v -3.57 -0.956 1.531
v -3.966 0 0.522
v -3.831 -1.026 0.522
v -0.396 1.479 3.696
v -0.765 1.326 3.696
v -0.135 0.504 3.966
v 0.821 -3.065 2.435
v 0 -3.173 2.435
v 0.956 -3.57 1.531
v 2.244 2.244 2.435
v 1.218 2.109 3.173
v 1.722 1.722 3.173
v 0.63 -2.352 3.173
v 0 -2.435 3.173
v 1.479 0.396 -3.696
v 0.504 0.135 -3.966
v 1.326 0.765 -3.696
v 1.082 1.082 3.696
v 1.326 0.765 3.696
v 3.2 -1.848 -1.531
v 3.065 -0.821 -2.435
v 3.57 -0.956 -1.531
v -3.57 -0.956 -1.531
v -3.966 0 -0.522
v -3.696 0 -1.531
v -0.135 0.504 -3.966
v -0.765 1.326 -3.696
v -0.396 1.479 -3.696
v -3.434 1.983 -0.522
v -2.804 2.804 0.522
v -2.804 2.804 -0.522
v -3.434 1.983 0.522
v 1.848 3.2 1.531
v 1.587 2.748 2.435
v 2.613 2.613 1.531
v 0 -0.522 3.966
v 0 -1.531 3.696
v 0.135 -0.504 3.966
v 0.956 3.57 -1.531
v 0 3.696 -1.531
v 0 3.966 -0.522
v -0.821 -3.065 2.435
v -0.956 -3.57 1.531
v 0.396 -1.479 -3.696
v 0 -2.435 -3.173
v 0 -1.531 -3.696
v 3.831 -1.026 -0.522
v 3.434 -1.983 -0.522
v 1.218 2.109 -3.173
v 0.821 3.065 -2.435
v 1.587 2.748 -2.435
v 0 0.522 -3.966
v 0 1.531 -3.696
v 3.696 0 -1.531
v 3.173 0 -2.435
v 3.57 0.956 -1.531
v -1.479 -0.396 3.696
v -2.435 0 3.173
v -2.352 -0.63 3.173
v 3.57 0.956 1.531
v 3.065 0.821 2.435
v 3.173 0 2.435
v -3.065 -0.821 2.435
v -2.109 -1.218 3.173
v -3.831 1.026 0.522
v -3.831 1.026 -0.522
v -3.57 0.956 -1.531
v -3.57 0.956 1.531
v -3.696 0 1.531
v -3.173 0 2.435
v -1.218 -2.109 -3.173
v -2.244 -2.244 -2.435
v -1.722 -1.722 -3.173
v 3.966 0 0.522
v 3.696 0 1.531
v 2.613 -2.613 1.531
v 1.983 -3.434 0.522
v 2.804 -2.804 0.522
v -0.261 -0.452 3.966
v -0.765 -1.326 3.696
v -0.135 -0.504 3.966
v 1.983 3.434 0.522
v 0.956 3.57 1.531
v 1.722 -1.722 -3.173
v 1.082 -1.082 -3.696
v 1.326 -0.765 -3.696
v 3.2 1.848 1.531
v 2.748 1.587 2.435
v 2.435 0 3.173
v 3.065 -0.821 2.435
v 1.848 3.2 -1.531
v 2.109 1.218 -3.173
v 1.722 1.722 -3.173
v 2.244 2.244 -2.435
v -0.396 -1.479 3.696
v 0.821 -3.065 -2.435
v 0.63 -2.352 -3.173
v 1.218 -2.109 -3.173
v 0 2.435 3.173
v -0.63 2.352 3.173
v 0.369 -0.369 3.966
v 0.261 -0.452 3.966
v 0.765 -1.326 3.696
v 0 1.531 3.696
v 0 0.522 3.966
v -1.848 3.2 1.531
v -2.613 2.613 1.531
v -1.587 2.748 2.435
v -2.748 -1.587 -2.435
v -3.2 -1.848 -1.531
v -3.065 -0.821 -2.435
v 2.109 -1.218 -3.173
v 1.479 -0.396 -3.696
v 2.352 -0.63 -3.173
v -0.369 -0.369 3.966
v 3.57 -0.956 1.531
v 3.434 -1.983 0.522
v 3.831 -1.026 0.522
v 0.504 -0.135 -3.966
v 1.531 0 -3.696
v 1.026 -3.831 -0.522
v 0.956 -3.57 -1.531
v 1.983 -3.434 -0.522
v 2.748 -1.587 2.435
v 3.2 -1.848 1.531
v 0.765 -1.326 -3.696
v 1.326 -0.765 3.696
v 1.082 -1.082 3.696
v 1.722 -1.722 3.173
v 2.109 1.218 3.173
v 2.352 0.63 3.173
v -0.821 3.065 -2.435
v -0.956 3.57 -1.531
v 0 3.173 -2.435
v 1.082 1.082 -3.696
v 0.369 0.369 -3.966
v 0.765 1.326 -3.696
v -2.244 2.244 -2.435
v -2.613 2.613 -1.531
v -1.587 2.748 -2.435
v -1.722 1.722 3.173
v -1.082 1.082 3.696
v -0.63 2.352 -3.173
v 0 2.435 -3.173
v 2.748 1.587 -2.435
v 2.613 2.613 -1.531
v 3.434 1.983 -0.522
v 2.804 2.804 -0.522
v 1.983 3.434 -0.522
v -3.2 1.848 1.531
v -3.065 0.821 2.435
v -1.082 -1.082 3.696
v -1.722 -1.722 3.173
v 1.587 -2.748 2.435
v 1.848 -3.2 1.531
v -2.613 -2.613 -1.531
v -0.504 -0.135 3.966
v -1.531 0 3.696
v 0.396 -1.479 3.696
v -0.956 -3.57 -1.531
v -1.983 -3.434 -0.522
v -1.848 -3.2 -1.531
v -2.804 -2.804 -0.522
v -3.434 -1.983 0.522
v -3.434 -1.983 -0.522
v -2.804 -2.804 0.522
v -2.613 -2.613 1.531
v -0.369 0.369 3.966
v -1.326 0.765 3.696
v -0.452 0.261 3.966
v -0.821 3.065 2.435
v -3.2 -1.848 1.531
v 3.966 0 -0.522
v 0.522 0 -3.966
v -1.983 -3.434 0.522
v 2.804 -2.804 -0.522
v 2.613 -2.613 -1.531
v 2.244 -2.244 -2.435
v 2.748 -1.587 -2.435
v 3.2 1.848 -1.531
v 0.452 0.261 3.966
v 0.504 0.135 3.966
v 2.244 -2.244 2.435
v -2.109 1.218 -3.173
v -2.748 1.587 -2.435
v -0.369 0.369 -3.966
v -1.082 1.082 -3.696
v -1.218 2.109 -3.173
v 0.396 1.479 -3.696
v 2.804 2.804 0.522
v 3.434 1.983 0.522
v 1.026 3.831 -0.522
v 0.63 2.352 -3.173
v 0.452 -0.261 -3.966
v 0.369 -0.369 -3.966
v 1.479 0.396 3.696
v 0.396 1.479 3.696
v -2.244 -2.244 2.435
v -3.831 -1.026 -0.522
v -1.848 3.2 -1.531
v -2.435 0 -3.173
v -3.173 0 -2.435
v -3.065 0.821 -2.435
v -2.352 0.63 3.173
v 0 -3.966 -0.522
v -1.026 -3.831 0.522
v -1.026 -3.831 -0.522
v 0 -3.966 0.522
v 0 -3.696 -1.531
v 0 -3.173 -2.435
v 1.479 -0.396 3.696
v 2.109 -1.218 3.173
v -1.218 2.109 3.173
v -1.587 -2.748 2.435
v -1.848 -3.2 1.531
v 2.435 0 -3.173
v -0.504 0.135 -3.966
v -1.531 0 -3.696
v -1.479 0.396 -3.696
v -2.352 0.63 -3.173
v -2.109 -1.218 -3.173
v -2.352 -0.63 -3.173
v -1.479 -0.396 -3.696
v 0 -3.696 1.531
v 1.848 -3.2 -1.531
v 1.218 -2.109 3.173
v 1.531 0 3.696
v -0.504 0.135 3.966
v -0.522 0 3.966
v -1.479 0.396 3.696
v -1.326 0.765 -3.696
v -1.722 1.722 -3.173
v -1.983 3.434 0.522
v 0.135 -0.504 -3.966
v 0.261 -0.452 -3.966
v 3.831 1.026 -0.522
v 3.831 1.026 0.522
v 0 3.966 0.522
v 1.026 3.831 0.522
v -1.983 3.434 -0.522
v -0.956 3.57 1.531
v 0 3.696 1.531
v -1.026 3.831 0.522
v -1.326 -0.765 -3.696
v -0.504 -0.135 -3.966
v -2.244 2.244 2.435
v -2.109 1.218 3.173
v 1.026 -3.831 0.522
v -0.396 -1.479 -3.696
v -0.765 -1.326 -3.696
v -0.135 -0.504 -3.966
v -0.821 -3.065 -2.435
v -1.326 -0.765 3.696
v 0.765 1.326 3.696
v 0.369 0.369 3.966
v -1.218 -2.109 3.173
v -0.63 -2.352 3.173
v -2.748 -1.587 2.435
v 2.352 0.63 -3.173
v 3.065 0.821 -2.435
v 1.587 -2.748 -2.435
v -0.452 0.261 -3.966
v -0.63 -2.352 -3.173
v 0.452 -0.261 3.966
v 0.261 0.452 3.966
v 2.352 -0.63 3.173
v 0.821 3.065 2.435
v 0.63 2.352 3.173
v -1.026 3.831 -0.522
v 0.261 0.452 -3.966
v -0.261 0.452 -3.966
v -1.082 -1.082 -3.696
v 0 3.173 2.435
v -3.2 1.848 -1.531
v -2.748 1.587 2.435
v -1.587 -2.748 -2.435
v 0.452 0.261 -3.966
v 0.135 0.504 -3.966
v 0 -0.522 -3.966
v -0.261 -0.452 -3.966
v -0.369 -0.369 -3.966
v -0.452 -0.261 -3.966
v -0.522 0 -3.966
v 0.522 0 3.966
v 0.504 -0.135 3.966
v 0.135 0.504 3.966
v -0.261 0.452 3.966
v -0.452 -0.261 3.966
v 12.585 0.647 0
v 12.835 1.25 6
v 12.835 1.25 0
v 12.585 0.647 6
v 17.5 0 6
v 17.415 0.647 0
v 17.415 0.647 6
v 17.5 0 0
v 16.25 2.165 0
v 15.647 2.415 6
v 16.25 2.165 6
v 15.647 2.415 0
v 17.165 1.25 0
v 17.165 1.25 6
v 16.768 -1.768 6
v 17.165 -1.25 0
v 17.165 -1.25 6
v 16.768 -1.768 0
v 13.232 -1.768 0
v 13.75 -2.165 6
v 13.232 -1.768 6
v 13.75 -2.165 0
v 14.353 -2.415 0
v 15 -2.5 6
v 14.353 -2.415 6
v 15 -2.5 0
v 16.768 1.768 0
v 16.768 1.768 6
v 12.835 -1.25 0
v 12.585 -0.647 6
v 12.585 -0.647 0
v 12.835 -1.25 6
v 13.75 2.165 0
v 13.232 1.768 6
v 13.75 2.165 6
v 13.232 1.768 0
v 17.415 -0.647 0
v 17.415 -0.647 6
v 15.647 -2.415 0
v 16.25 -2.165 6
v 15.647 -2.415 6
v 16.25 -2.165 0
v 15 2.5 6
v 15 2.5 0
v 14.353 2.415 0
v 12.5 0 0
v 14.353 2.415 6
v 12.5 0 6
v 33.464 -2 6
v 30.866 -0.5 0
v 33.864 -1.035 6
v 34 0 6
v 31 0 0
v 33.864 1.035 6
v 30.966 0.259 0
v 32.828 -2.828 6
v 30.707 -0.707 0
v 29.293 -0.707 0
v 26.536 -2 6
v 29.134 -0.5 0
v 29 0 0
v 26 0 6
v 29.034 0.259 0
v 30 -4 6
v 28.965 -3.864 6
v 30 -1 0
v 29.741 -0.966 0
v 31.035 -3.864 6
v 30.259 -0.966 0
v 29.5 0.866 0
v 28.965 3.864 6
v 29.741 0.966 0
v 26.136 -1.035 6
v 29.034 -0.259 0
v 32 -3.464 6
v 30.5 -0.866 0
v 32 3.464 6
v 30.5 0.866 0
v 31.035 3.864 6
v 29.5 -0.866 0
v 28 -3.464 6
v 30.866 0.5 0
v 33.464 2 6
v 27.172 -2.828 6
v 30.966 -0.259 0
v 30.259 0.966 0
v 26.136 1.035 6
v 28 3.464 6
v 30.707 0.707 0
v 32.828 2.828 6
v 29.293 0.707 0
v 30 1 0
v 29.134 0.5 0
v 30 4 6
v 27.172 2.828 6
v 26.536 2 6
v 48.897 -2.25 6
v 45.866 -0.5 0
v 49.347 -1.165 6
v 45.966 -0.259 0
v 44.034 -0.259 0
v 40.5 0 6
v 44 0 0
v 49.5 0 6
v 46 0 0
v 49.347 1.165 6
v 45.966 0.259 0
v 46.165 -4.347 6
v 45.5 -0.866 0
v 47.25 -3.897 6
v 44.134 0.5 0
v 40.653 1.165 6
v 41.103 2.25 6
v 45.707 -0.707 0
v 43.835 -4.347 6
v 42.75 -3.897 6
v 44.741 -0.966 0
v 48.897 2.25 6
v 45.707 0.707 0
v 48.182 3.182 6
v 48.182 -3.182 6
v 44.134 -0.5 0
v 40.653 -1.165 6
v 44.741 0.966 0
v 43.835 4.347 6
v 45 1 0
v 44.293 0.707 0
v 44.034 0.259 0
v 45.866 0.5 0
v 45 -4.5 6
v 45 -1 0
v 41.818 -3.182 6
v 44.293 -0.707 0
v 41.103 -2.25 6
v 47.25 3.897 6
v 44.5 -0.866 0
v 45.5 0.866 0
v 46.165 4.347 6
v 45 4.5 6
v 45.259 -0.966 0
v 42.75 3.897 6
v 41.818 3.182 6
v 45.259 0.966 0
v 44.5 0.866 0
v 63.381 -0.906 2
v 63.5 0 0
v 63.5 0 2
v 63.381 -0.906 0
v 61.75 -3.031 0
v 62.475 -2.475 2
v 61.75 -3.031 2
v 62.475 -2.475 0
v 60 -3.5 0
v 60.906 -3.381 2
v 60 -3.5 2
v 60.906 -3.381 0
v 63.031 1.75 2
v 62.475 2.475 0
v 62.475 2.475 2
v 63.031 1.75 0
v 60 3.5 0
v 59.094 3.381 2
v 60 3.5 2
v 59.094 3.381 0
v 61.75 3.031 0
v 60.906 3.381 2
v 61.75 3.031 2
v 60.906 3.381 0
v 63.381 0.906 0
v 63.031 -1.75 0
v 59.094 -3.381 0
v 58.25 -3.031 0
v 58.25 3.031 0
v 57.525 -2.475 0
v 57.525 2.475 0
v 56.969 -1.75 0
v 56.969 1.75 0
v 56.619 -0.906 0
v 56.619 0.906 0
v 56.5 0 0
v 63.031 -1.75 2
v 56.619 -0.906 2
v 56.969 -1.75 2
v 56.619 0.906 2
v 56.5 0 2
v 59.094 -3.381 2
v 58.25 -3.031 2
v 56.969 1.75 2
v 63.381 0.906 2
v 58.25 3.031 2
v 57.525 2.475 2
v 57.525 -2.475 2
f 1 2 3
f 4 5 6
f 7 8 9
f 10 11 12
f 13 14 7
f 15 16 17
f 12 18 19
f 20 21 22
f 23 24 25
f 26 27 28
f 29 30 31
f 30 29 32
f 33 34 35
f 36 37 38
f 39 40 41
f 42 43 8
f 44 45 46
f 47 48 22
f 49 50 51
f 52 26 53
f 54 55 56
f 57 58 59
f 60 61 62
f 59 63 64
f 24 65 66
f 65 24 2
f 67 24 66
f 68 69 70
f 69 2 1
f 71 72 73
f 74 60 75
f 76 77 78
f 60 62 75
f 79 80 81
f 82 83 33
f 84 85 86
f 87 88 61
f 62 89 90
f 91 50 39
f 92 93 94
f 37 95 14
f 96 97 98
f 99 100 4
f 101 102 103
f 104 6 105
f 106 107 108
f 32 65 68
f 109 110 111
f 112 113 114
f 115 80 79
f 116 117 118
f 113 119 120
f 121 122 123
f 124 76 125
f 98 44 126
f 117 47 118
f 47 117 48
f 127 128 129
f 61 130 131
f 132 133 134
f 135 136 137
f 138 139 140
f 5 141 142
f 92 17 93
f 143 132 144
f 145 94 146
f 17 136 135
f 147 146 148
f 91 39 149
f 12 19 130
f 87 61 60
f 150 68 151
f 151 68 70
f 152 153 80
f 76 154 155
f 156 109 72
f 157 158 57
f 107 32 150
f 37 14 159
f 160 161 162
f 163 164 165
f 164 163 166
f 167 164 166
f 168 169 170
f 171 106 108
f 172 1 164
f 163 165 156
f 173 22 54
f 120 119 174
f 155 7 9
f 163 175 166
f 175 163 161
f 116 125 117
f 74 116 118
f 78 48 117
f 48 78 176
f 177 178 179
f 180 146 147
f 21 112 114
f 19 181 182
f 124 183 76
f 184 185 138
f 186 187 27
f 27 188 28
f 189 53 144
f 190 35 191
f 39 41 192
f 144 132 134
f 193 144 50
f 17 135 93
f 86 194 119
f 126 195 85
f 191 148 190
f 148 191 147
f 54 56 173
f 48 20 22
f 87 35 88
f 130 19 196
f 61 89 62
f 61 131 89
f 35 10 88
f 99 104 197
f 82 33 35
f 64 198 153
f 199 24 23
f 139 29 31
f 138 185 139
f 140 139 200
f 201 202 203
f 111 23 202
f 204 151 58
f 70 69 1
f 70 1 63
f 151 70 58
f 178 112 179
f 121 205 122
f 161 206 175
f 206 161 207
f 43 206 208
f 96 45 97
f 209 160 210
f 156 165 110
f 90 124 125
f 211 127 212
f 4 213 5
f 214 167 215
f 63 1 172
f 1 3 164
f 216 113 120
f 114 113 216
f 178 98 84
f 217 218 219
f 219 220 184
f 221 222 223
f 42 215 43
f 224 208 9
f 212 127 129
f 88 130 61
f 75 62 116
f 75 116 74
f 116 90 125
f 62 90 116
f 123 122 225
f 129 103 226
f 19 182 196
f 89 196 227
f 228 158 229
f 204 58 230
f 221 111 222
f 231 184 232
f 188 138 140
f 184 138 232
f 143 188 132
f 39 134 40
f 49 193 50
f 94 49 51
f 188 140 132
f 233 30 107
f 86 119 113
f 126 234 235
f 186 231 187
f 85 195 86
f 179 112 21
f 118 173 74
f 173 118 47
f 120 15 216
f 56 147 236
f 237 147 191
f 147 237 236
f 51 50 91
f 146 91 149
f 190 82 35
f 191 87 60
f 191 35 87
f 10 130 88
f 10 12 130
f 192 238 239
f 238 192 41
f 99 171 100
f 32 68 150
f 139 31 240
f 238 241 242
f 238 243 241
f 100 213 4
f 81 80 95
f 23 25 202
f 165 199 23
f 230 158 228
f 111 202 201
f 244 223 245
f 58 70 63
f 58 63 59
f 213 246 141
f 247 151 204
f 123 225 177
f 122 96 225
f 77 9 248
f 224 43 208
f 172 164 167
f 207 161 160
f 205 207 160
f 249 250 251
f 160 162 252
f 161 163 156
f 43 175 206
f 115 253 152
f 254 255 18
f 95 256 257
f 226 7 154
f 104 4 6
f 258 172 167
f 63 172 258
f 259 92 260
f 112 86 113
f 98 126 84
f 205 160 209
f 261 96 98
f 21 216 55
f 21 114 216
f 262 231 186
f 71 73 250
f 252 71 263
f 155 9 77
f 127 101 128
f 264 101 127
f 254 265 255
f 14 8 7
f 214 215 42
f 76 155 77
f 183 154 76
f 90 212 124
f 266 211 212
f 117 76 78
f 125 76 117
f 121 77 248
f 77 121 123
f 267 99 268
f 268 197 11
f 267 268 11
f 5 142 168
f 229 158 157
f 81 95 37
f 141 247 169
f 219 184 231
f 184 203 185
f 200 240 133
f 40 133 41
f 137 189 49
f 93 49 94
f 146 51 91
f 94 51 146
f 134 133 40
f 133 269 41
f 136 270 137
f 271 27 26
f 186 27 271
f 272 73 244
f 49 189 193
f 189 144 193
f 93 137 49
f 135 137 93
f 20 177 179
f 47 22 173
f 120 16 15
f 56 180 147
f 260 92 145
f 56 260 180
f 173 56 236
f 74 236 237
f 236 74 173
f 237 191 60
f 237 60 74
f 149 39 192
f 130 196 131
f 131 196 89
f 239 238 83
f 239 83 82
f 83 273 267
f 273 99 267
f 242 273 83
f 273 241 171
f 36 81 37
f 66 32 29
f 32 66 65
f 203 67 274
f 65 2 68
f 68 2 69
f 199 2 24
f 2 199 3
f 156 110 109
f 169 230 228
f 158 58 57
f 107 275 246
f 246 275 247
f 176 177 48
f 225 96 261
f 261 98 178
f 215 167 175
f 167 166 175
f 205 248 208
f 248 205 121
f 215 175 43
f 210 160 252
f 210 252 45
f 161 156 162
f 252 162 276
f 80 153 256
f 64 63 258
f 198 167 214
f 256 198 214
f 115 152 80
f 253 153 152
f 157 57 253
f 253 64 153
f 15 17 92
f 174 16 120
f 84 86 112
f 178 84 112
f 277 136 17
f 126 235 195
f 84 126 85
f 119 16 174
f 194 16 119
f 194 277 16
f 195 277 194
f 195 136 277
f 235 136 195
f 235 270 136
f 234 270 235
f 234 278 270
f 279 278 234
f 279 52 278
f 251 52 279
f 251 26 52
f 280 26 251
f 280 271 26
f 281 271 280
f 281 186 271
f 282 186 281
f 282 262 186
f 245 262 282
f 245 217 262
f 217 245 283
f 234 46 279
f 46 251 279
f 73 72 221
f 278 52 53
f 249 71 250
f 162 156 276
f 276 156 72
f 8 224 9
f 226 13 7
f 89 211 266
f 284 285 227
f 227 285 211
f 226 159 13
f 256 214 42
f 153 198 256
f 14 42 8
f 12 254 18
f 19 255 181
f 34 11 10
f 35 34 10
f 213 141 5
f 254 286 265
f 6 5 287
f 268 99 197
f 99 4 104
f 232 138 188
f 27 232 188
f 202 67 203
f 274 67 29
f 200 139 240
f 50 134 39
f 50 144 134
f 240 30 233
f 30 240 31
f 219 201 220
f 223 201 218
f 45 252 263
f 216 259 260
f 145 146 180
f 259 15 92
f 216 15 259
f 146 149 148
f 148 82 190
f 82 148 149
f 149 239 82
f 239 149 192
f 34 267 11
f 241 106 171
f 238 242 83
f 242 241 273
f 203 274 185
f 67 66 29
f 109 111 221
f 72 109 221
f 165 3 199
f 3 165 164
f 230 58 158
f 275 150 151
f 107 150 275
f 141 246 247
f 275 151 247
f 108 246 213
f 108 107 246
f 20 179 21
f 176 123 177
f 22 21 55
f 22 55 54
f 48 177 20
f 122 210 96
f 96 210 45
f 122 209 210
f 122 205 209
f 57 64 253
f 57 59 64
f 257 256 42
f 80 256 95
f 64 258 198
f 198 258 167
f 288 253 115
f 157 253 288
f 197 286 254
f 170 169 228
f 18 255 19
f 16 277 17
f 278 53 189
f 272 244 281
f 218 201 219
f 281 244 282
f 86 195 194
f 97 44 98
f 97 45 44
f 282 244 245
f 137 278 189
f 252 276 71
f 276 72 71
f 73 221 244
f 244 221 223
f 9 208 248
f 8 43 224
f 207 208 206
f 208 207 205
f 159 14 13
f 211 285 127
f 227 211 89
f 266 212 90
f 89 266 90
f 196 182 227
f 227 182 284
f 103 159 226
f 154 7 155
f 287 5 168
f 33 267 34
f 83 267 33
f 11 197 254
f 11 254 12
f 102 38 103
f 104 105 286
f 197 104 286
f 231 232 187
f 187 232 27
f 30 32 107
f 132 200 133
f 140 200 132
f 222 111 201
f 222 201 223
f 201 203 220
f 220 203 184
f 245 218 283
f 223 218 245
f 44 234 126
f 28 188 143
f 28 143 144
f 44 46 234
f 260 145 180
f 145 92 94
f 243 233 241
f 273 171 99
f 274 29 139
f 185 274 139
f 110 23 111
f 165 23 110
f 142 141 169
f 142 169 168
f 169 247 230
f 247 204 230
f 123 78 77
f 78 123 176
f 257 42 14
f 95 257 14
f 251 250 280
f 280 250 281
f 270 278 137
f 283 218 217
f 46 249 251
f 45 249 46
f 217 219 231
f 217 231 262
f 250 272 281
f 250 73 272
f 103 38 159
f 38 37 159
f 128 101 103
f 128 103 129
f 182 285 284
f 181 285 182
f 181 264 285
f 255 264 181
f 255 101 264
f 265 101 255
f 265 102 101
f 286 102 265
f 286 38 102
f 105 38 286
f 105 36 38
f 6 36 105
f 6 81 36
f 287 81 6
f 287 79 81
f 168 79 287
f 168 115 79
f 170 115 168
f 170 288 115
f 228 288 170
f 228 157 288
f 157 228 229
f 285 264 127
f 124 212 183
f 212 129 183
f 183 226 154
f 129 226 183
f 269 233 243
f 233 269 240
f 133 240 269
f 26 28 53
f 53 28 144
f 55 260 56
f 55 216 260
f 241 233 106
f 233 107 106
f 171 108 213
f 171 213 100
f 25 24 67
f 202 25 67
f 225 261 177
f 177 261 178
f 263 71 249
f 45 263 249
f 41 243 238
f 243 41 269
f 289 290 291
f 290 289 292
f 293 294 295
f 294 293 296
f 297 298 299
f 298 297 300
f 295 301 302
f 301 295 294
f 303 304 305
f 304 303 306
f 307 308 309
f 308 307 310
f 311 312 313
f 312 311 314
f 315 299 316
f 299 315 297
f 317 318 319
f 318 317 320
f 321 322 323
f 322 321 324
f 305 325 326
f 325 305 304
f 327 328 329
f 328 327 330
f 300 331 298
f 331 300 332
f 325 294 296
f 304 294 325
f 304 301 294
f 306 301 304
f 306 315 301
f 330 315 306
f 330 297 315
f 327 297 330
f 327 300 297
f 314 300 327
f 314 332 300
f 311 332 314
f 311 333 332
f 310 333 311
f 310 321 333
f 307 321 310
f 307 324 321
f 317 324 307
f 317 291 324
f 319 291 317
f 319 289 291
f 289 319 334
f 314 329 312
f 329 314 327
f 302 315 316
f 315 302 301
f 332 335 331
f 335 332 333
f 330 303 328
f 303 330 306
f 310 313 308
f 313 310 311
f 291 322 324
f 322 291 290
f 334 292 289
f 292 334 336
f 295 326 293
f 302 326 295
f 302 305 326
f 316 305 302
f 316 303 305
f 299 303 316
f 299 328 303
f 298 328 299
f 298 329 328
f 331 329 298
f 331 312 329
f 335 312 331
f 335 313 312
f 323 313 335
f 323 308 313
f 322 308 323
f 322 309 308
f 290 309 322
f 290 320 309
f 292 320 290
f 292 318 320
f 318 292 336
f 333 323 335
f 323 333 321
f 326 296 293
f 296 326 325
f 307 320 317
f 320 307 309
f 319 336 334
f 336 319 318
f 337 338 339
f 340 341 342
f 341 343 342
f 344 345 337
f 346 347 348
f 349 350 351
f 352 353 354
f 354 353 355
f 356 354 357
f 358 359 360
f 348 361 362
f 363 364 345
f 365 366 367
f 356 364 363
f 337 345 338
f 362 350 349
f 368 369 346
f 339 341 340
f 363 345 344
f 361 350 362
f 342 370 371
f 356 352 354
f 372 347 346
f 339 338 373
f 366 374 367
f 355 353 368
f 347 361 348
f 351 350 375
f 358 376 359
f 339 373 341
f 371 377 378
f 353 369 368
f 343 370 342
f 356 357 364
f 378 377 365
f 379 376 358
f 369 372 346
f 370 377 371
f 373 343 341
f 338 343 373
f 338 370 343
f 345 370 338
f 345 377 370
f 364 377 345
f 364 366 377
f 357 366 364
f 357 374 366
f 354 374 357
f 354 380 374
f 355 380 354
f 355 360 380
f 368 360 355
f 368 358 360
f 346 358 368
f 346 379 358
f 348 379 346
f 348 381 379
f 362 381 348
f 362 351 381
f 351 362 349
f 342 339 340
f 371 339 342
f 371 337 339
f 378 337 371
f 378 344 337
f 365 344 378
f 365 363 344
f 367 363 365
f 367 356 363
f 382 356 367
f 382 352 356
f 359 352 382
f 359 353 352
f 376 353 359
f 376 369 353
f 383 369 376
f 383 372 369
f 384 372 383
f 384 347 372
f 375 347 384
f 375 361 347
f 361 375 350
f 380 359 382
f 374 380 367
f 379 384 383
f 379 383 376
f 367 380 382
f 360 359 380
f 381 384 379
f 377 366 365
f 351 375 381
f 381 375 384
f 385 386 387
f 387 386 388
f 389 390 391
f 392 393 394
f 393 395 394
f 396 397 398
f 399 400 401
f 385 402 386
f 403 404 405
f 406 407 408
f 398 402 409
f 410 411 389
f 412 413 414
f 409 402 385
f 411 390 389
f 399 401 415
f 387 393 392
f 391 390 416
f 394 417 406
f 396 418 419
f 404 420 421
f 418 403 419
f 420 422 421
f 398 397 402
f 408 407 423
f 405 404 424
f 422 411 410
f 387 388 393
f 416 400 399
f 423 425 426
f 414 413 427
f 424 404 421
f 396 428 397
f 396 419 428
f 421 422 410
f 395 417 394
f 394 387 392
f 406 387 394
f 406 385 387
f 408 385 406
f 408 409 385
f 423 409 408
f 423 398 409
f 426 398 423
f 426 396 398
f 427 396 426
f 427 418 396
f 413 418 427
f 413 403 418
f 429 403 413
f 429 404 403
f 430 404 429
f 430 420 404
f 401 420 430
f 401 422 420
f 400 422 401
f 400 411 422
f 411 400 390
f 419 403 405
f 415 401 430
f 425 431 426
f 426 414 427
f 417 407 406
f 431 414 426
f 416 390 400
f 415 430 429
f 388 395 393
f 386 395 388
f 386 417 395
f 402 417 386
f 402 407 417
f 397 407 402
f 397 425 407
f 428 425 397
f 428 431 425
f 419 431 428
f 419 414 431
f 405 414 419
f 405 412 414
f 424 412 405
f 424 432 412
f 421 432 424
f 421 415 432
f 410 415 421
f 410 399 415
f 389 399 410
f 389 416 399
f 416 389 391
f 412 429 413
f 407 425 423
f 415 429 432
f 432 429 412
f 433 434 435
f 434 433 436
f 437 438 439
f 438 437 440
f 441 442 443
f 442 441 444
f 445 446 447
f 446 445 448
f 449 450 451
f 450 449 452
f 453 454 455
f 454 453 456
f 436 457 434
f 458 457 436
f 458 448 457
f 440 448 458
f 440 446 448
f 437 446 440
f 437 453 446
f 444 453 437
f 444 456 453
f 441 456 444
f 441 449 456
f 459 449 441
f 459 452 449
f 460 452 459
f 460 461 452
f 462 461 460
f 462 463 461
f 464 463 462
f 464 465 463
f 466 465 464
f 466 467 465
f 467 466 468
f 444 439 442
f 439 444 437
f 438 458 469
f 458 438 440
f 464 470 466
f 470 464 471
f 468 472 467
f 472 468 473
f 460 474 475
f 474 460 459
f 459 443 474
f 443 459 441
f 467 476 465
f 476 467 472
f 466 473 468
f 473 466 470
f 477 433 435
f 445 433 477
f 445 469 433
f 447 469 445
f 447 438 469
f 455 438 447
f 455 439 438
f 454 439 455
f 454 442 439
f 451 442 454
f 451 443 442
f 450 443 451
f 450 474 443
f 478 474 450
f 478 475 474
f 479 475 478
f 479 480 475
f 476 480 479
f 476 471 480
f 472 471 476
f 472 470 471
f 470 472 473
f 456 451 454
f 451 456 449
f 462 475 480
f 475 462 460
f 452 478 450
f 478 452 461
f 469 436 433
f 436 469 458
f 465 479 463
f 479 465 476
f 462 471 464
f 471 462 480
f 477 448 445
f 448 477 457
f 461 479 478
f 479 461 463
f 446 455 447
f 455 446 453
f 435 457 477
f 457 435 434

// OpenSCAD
// The `d=` spellings, and the precedence of the per-end diameters over `d`.
sphere(d = 8, $fn = 24);
translate([15,0,0]) cylinder(h = 6, d = 5, $fn = 24);
translate([30,0,0]) cylinder(h = 6, d1 = 2, d2 = 8, $fn = 24);
translate([45,0,0]) cylinder(h = 6, d = 9, d1 = 2, $fn = 24);   // d1 wins at the base
translate([60,0,0]) linear_extrude(2) circle(d = 7, $fn = 24);
